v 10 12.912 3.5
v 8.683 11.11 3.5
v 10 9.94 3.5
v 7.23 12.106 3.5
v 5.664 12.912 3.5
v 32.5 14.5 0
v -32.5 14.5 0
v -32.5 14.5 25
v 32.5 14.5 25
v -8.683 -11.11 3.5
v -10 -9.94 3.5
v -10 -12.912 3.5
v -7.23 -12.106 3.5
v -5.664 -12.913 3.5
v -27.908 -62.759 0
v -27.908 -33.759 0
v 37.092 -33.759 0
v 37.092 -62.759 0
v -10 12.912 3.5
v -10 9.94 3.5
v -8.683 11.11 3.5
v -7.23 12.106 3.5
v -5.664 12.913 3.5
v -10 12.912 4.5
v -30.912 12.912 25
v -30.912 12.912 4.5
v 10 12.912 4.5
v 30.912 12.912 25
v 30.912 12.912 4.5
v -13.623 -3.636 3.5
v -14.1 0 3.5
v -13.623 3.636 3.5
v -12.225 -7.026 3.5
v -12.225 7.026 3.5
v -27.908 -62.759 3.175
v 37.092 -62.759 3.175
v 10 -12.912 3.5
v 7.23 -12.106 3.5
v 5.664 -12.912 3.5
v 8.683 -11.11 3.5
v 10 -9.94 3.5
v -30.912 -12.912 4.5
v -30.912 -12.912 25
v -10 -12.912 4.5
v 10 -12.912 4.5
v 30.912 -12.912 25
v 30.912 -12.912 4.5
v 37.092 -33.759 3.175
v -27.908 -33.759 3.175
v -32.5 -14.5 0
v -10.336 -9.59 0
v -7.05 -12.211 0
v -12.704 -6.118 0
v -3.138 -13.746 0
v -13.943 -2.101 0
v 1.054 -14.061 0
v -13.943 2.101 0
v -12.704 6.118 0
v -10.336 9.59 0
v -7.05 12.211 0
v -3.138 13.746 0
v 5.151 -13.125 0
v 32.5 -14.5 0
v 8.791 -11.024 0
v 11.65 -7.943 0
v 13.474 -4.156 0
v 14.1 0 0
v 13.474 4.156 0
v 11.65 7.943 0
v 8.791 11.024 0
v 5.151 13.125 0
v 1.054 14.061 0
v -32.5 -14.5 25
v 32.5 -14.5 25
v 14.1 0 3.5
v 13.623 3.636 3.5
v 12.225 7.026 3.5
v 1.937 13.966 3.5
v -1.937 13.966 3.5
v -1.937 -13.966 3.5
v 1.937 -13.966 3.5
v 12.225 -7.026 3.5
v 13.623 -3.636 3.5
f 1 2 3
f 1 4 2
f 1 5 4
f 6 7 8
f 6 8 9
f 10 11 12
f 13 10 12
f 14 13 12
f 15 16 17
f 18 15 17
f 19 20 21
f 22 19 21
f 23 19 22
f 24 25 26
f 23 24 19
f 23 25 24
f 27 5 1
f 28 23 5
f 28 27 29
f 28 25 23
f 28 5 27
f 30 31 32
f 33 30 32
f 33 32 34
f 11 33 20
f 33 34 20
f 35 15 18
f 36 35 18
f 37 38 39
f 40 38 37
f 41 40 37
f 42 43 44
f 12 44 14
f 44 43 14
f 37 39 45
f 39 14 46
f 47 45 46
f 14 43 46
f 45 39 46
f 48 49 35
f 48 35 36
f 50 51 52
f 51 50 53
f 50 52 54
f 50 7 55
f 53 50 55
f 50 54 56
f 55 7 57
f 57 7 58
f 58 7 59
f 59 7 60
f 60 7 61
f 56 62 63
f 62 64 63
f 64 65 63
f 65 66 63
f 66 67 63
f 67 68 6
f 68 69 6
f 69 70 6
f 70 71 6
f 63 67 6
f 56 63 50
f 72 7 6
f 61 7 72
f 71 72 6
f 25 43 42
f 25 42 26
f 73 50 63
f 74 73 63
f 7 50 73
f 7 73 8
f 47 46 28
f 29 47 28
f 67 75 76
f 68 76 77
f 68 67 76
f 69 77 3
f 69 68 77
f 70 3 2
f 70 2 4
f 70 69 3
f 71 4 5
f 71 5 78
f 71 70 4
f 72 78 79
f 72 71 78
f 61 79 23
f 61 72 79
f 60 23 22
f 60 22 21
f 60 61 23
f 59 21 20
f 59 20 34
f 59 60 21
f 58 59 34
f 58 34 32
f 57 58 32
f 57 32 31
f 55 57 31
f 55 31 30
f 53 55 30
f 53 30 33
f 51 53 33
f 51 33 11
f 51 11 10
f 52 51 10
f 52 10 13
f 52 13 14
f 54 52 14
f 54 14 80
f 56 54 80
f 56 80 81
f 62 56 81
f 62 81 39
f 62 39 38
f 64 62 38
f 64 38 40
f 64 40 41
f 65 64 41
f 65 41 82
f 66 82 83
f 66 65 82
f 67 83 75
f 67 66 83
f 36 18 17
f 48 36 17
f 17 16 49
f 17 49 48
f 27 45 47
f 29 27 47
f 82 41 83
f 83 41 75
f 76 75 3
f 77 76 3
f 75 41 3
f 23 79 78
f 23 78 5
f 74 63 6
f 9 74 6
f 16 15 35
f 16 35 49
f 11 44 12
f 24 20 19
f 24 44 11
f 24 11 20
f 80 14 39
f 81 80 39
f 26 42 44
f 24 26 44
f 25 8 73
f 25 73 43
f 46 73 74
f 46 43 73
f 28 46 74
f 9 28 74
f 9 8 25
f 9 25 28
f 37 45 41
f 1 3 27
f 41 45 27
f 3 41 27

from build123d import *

# Parameters (mm, degrees)
F0_W     = 65
F0_H     = 29
F1_DEPTH = 25
F2_R     = 14.1
F3_DEPTH = 3.5
F4_W     = 61.825
F4_H     = 25.825
F5_DEPTH = 20.5
F6_W     = 65
F6_H     = 29
F7_DEPTH = 3.175
F8_W     = 20
F8_H     = 25.825
F9_DEPTH = 1


with BuildPart() as f1:
    # F0 (on Top) → F1 (new body)
    with BuildSketch(Plane.XY):
        Rectangle(F0_W, F0_H)
    extrude(amount=F1_DEPTH)

    # F2 (on Top) → F3 (cut)
    with BuildSketch(Plane.XY):
        Circle(F2_R)
    extrude(amount=F3_DEPTH, mode=Mode.SUBTRACT)

    # F4 (on face) → F5 (cut)
    with BuildSketch(Plane.XY.offset(25)):
        Rectangle(F4_W, F4_H)
    extrude(amount=-F5_DEPTH, mode=Mode.SUBTRACT)

    # F8 (on face) → F9 (cut)
    with BuildSketch(Plane.XY.offset(4.5)):
        Rectangle(F8_W, F8_H)
    extrude(amount=-F9_DEPTH, mode=Mode.SUBTRACT)


with BuildPart() as f7:
    # F6 (on Top) → F7 (new body)
    with BuildSketch(Plane.XY):
        with Locations((4.592014, -48.259111)):
            Rectangle(F6_W, F6_H)
    extrude(amount=F7_DEPTH)


solid = Compound([f1.part, f7.part])
